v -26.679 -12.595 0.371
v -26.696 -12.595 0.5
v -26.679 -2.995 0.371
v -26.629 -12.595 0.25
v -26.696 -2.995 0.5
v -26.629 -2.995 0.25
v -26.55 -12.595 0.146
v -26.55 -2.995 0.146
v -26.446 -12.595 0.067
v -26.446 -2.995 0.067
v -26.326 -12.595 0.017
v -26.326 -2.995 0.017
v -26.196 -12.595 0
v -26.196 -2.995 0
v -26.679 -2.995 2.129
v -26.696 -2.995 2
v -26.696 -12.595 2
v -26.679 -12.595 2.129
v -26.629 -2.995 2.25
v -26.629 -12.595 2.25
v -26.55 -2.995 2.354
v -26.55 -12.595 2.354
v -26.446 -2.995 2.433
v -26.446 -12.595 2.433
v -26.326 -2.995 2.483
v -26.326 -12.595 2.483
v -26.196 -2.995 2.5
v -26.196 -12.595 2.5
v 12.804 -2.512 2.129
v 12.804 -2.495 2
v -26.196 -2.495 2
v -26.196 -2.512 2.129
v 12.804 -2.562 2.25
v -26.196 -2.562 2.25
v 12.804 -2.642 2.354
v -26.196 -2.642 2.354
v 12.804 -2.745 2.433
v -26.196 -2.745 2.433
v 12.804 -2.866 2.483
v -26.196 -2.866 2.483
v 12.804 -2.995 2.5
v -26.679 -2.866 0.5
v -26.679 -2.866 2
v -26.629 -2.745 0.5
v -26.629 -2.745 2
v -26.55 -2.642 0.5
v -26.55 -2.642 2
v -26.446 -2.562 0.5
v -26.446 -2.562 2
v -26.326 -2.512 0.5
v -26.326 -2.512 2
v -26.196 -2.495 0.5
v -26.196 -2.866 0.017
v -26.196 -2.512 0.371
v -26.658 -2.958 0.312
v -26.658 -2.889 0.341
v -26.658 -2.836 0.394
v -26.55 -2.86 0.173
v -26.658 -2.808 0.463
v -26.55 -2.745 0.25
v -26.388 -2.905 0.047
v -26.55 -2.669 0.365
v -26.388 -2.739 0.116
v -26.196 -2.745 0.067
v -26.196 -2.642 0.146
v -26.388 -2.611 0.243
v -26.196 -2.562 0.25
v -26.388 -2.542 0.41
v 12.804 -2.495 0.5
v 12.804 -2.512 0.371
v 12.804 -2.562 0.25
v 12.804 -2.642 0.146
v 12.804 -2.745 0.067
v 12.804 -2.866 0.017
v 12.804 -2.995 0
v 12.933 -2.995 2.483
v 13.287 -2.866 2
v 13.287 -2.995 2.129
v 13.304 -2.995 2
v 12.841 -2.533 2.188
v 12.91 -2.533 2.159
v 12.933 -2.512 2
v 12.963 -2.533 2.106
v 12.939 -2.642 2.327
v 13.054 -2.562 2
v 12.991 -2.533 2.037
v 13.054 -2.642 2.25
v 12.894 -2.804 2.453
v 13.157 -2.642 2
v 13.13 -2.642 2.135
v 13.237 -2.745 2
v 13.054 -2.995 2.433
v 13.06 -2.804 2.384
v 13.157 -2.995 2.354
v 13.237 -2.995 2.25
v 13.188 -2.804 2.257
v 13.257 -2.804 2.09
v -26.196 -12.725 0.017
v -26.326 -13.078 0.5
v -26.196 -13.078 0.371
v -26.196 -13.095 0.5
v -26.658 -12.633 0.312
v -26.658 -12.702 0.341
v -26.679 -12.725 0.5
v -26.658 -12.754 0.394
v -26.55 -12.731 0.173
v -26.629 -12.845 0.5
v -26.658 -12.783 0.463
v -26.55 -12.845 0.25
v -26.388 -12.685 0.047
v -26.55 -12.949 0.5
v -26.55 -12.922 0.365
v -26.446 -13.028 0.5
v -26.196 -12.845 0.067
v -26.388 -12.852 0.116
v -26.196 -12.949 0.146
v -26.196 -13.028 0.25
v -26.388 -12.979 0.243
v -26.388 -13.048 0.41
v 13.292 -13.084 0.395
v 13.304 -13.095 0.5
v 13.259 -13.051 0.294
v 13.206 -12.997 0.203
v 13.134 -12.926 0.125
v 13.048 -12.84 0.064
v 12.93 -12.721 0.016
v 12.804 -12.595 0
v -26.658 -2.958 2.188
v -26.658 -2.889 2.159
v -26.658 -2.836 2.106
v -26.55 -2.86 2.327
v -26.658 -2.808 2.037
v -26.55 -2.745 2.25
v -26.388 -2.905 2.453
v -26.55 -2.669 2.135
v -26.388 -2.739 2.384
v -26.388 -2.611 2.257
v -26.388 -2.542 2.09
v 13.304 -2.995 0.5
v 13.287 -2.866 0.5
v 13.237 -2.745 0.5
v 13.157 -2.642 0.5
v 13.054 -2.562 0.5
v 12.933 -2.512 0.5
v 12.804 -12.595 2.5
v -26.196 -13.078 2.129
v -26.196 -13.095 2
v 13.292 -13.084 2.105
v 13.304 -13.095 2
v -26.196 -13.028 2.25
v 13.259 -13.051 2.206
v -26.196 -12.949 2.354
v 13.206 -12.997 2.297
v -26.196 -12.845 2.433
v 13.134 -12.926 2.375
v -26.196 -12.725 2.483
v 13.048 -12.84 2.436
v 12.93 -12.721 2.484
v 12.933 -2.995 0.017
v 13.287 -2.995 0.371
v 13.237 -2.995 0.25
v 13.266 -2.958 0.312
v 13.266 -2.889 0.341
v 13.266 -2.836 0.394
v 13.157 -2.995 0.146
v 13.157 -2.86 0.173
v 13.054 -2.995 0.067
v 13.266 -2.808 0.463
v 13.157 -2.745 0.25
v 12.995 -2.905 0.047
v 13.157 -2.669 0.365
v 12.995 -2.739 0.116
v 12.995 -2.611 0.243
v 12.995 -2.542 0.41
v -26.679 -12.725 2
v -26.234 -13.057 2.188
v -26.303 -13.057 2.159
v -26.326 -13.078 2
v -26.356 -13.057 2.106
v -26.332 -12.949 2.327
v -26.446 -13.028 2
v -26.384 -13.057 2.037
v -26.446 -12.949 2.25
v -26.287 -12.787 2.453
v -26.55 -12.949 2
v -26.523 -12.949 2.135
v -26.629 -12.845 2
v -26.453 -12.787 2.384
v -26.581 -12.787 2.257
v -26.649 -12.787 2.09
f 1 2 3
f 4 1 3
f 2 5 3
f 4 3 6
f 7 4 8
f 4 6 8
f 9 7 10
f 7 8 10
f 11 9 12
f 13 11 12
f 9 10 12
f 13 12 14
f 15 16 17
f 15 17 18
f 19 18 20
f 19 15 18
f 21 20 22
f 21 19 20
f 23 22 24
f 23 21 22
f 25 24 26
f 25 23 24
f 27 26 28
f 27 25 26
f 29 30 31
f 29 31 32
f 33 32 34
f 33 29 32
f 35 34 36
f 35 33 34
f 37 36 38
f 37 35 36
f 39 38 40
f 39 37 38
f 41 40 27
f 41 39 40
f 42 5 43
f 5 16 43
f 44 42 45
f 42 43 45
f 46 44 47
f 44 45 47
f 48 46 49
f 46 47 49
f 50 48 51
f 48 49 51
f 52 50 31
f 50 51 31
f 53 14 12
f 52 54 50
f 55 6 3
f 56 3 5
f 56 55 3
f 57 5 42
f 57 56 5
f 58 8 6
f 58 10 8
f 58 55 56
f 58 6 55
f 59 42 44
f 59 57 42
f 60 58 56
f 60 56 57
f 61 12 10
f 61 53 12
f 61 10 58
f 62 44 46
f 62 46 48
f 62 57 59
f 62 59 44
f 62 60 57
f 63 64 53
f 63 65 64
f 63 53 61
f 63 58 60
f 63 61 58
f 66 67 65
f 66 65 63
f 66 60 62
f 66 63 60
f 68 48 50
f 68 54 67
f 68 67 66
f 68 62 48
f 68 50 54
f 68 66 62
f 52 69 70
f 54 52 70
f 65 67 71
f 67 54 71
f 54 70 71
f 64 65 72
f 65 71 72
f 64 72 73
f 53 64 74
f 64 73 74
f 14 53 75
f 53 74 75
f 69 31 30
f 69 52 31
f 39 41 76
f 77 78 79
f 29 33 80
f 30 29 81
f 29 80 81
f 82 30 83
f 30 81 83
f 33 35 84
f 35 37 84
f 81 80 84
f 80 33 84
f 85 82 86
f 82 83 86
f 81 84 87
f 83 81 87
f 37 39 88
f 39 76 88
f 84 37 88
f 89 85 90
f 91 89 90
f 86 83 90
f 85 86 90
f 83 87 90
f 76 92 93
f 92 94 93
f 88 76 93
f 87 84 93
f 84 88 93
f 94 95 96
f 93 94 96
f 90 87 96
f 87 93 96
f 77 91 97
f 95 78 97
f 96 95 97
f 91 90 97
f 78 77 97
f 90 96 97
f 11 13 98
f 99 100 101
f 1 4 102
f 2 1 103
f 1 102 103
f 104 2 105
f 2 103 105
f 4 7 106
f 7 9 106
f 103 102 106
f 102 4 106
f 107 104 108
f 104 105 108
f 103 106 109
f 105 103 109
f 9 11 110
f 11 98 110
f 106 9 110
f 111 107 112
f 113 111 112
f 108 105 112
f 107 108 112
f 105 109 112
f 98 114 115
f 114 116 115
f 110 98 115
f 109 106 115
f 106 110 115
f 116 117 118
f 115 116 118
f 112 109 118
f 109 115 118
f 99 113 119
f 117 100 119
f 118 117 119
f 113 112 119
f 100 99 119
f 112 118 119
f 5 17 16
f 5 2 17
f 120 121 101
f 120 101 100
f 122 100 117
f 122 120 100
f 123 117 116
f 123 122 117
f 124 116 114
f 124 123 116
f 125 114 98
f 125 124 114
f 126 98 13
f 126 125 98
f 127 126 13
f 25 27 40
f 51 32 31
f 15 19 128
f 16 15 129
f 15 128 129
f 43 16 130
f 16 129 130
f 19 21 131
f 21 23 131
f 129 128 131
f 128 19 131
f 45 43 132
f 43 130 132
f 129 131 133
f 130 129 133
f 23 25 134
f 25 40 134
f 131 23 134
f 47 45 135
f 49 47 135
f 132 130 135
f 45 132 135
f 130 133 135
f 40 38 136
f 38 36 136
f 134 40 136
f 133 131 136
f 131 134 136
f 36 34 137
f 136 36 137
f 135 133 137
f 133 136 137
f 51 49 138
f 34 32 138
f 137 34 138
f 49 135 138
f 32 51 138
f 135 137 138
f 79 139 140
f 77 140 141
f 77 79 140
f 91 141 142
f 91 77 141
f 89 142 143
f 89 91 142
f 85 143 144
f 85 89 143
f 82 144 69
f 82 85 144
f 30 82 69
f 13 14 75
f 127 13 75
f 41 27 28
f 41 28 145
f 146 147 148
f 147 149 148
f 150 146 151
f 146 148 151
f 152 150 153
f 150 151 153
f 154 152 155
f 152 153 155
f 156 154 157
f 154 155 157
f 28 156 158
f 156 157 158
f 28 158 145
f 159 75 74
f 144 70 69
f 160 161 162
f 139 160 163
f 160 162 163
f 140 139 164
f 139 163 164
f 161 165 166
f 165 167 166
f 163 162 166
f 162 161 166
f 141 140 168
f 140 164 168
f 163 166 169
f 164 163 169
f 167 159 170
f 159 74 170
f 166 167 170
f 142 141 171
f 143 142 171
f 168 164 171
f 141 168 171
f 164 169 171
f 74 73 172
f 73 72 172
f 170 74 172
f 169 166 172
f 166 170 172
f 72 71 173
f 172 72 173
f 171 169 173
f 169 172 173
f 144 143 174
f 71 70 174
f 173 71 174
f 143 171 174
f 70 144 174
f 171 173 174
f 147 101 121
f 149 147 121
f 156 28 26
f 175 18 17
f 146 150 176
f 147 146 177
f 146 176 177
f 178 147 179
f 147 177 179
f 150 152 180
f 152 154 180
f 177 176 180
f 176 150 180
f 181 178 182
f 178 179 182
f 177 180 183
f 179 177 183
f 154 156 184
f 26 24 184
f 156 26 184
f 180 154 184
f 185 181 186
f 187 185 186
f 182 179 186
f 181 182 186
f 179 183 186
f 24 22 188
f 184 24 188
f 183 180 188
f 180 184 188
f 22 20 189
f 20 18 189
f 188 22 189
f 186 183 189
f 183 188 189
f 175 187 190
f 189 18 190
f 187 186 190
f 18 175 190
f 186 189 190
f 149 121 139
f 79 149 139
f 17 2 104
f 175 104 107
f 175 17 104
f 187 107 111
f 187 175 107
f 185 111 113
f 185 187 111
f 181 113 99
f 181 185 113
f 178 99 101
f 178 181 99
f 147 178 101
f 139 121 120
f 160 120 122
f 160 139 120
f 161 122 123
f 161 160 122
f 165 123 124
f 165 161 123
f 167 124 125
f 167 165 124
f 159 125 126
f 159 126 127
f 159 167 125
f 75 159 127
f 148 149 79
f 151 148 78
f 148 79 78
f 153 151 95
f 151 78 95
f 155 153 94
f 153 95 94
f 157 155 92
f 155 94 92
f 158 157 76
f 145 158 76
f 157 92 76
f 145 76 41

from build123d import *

# Parameters (mm, degrees)
SKETCH1_W           = 40
SKETCH1_H           = 10.6
BOSS_EXTRUDE1_DEPTH = 2.5
FILLET1_R           = 0.5


with BuildPart() as part:
    # Sketch1 → Boss-Extrude1 (new body)
    with BuildSketch(Plane.XY):
        with Locations((-6.696428571, -7.795238095)):
            Rectangle(SKETCH1_W, SKETCH1_H)
    extrude(amount=BOSS_EXTRUDE1_DEPTH)

    # Fillet1
    fillet1_edges = [part.edges().sort_by_distance(p)[0] for p in [
        (13.303571429, -7.795238095, 2.5),
        (-6.696428571, -2.495238095, 2.5),
        (-26.696428571, -7.795238095, 2.5),
        (-6.696428571, -2.495238095, 0),
        (13.303571429, -7.795238095, 0),
        (-6.696428571, -13.095238095, 0),
        (-26.696428571, -7.795238095, 0),
        (-6.696428571, -13.095238095, 2.5),
        (-26.696428571, -2.495238095, 1.25),
        (13.303571429, -2.495238095, 1.25),
        (-26.696428571, -13.095238095, 1.25),
    ]]
    fillet(fillet1_edges, radius=FILLET1_R)


solid = part.part
